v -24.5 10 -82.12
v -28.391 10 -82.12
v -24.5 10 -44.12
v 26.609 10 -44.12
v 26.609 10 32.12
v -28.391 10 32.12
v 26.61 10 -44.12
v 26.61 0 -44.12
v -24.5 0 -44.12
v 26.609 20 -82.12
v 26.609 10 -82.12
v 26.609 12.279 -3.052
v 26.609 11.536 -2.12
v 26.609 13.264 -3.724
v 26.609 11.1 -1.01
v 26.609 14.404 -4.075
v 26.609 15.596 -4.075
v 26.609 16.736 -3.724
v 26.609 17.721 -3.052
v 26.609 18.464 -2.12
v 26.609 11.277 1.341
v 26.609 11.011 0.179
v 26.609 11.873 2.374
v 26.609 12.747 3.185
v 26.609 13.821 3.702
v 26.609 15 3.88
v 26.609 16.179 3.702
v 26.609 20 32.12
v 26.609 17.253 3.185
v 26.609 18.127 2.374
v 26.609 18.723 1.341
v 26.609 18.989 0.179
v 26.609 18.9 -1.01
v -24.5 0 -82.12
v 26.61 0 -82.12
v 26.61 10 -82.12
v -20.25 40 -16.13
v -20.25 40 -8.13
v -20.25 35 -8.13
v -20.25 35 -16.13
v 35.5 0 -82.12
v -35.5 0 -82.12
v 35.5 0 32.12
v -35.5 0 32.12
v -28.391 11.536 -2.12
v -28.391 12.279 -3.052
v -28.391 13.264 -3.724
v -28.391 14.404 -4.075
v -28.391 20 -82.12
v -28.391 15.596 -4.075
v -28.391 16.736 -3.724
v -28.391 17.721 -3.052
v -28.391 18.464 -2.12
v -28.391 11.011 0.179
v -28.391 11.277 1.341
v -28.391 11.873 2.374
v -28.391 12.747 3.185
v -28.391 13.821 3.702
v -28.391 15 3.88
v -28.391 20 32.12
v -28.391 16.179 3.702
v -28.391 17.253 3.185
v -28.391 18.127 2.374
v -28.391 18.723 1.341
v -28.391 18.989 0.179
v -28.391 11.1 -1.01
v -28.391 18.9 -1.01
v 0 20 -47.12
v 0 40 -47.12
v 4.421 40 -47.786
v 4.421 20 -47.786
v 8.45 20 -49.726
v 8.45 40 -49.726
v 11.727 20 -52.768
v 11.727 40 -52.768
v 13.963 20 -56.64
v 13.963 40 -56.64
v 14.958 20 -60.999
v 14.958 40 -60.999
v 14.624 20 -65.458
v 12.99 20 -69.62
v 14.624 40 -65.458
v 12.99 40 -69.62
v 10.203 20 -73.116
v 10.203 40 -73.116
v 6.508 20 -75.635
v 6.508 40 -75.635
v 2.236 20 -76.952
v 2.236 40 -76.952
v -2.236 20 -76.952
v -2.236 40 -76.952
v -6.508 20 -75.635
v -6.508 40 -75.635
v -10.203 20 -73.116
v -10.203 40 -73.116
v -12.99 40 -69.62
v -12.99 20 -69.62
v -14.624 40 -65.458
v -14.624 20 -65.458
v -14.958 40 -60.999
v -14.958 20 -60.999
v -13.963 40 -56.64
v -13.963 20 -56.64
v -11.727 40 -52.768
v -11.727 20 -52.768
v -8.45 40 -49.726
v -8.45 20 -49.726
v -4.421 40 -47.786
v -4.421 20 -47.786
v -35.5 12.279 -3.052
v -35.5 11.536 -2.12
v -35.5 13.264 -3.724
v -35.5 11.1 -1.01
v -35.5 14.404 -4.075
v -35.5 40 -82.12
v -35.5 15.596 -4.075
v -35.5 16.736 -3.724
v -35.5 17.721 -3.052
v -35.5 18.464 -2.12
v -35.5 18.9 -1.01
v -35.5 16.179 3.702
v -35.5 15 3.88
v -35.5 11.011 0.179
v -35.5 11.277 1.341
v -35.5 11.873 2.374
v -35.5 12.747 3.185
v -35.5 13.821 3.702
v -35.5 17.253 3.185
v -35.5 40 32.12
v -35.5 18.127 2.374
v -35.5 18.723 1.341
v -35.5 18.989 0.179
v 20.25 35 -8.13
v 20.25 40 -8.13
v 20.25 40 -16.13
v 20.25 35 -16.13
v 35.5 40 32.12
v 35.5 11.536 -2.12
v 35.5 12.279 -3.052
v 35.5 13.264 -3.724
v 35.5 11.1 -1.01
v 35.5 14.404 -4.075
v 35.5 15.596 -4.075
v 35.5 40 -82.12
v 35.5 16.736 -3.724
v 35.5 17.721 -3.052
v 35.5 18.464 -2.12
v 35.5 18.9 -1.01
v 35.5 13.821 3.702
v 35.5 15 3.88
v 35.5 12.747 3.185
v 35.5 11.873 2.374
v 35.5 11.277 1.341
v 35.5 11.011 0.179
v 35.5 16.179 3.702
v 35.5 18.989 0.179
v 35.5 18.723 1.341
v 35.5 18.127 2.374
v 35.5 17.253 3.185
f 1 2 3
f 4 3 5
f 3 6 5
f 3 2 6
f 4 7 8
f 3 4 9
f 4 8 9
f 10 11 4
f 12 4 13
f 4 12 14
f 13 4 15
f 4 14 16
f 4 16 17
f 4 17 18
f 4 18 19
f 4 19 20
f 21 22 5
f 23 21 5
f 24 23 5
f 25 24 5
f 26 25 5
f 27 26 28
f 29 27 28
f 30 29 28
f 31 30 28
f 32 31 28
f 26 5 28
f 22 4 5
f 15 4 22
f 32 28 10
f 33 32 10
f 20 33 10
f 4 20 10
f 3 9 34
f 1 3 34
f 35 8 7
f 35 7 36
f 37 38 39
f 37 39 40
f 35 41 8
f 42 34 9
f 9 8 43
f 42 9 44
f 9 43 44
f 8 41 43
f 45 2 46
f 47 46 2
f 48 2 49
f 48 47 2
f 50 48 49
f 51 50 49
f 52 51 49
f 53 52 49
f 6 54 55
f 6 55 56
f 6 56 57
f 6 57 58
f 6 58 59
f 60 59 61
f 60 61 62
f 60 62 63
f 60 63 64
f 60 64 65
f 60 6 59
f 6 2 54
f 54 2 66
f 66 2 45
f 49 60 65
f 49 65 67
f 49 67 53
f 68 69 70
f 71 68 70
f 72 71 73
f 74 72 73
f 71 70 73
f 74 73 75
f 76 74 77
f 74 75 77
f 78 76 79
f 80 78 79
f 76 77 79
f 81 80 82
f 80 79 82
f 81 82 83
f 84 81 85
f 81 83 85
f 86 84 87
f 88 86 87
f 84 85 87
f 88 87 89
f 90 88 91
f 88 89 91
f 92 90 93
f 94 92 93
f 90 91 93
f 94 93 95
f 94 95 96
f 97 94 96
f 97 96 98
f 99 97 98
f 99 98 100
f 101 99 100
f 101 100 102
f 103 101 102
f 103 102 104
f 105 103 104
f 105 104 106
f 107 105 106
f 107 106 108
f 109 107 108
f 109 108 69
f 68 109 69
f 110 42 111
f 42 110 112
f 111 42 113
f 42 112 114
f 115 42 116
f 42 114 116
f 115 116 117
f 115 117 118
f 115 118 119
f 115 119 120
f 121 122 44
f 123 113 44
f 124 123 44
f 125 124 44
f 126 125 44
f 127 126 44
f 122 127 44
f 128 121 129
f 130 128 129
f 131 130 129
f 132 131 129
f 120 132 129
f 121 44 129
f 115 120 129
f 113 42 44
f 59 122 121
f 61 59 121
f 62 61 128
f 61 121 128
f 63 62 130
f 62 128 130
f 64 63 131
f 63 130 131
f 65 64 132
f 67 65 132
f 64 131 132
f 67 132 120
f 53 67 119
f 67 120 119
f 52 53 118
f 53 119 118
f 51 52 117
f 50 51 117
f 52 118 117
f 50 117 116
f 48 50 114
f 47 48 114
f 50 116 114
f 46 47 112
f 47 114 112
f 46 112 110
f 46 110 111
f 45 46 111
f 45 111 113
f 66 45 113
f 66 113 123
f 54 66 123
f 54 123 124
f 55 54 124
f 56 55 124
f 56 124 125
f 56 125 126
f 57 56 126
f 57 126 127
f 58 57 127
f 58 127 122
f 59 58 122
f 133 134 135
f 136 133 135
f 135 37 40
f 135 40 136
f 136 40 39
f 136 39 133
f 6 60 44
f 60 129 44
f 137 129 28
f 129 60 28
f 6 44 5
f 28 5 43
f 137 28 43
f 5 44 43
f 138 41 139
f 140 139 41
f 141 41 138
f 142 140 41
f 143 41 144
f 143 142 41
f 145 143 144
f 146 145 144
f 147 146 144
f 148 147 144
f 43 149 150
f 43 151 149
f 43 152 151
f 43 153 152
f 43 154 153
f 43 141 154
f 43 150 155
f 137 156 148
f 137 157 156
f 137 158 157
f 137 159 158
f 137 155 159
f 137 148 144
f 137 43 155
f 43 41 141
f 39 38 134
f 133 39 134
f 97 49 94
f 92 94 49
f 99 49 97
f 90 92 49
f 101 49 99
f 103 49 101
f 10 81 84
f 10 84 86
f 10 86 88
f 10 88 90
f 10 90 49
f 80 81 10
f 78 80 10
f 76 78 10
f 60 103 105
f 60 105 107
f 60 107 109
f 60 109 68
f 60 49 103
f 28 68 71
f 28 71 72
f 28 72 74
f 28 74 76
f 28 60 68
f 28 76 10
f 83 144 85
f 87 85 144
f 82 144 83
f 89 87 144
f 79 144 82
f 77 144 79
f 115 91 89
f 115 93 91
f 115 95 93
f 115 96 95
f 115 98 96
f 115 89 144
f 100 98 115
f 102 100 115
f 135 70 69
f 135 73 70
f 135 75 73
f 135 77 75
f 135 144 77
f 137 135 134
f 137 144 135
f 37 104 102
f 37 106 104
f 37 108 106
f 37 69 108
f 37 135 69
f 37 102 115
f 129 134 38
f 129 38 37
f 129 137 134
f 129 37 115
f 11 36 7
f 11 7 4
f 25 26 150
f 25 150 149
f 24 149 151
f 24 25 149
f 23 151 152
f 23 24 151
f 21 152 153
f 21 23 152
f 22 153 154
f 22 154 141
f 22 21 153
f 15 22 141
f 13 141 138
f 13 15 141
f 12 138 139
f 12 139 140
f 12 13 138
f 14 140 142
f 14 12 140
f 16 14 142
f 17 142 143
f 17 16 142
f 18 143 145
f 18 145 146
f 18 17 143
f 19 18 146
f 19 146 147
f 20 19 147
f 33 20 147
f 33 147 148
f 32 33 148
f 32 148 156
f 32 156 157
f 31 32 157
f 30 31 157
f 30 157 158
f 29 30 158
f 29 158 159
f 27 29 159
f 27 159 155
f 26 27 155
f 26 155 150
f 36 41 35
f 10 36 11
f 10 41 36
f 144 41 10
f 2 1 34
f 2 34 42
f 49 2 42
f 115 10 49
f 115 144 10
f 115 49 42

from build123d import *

# Parameters (mm, degrees)
SKETCH1_W           = 71
SKETCH1_H           = 64.24
BOSS_EXTRUDE1_DEPTH = 40
SKETCH2_R           = 4
CUT_EXTRUDE2_DEPTH  = 10
SKETCH5_W           = 71
SKETCH5_H           = 40
BOSS_EXTRUDE2_DEPTH = 50
SKETCH6_R           = 15
CUT_EXTRUDE3_DEPTH  = 98.999716326
SKETCH8_W           = 40.5
SKETCH8_H           = 8
CUT_EXTRUDE5_DEPTH  = 5
CUT_EXTRUDE6_START  = -10
SKETCH9_R           = 4
CUT_EXTRUDE6_DEPTH  = 10
SKETCH10_W          = 55
SKETCH10_H          = 10
CUT_EXTRUDE7_DEPTH  = 127.138921828
SKETCH11_W          = 51.11
SKETCH11_H          = 38
CUT_EXTRUDE8_DEPTH  = 10


with BuildPart() as part:
    # Sketch1 → Boss-Extrude1 (new body)
    with BuildSketch(Plane(origin=(0, 0, 0), x_dir=(1, 0, 0), z_dir=(0, 1, 0))):
        Rectangle(SKETCH1_W, SKETCH1_H)
    extrude(amount=BOSS_EXTRUDE1_DEPTH)

    # Sketch2 → Cut-Extrude2 (cut)
    with BuildSketch(Plane.ZY.offset(35.5)):
        with Locations((-0.12, 15)):
            Circle(SKETCH2_R)
    extrude(amount=-CUT_EXTRUDE2_DEPTH, mode=Mode.SUBTRACT)

    # Sketch5 → Boss-Extrude2 (add)
    with BuildSketch(Plane(origin=(0, 0, -32.12), x_dir=(-1, 0, 0), z_dir=(0, 0, -1))):
        with Locations((0, 20)):
            Rectangle(SKETCH5_W, SKETCH5_H)
    extrude(amount=BOSS_EXTRUDE2_DEPTH)

    # Sketch6 → Cut-Extrude3 (cut, through all)
    with BuildSketch(Plane(origin=(0, 40, 0), x_dir=(1, 0, 0), z_dir=(0, 1, 0))):
        with Locations(Location((0, 62.12, 0), (0, 0, 270))):
            Circle(SKETCH6_R)
    extrude(amount=-CUT_EXTRUDE3_DEPTH, mode=Mode.SUBTRACT)

    # Sketch8 → Cut-Extrude5 (cut)
    with BuildSketch(Plane(origin=(0, 40, 0), x_dir=(1, 0, 0), z_dir=(0, 1, 0))):
        with Locations((0, 12.13)):
            Rectangle(SKETCH8_W, SKETCH8_H)
    extrude(amount=-CUT_EXTRUDE5_DEPTH, mode=Mode.SUBTRACT)

    # Sketch9 → Cut-Extrude6 (cut)
    with BuildSketch(Plane(origin=(35.5, 0, 0), x_dir=(0, 0, -1), z_dir=(1, 0, 0)).offset(CUT_EXTRUDE6_START)):
        with Locations(Location((0.12, 15, 0), (0, 0, 180))):
            Circle(SKETCH9_R)
    extrude(amount=CUT_EXTRUDE6_DEPTH, mode=Mode.SUBTRACT)

    # Sketch10 → Cut-Extrude7 (cut, through all)
    with BuildSketch(Plane.XY.offset(32.12)):
        with Locations((-0.890825636, 15)):
            Rectangle(SKETCH10_W, SKETCH10_H)
    extrude(amount=-CUT_EXTRUDE7_DEPTH, mode=Mode.SUBTRACT)

    # Sketch11 → Cut-Extrude8 (cut)
    with BuildSketch(Plane(origin=(0, 0, 0), x_dir=(-1, 0, 0), z_dir=(0, -1, 0))):
        with Locations((-1.055, 63.12)):
            Rectangle(SKETCH11_W, SKETCH11_H)
    extrude(amount=-CUT_EXTRUDE8_DEPTH, mode=Mode.SUBTRACT)


solid = part.part
